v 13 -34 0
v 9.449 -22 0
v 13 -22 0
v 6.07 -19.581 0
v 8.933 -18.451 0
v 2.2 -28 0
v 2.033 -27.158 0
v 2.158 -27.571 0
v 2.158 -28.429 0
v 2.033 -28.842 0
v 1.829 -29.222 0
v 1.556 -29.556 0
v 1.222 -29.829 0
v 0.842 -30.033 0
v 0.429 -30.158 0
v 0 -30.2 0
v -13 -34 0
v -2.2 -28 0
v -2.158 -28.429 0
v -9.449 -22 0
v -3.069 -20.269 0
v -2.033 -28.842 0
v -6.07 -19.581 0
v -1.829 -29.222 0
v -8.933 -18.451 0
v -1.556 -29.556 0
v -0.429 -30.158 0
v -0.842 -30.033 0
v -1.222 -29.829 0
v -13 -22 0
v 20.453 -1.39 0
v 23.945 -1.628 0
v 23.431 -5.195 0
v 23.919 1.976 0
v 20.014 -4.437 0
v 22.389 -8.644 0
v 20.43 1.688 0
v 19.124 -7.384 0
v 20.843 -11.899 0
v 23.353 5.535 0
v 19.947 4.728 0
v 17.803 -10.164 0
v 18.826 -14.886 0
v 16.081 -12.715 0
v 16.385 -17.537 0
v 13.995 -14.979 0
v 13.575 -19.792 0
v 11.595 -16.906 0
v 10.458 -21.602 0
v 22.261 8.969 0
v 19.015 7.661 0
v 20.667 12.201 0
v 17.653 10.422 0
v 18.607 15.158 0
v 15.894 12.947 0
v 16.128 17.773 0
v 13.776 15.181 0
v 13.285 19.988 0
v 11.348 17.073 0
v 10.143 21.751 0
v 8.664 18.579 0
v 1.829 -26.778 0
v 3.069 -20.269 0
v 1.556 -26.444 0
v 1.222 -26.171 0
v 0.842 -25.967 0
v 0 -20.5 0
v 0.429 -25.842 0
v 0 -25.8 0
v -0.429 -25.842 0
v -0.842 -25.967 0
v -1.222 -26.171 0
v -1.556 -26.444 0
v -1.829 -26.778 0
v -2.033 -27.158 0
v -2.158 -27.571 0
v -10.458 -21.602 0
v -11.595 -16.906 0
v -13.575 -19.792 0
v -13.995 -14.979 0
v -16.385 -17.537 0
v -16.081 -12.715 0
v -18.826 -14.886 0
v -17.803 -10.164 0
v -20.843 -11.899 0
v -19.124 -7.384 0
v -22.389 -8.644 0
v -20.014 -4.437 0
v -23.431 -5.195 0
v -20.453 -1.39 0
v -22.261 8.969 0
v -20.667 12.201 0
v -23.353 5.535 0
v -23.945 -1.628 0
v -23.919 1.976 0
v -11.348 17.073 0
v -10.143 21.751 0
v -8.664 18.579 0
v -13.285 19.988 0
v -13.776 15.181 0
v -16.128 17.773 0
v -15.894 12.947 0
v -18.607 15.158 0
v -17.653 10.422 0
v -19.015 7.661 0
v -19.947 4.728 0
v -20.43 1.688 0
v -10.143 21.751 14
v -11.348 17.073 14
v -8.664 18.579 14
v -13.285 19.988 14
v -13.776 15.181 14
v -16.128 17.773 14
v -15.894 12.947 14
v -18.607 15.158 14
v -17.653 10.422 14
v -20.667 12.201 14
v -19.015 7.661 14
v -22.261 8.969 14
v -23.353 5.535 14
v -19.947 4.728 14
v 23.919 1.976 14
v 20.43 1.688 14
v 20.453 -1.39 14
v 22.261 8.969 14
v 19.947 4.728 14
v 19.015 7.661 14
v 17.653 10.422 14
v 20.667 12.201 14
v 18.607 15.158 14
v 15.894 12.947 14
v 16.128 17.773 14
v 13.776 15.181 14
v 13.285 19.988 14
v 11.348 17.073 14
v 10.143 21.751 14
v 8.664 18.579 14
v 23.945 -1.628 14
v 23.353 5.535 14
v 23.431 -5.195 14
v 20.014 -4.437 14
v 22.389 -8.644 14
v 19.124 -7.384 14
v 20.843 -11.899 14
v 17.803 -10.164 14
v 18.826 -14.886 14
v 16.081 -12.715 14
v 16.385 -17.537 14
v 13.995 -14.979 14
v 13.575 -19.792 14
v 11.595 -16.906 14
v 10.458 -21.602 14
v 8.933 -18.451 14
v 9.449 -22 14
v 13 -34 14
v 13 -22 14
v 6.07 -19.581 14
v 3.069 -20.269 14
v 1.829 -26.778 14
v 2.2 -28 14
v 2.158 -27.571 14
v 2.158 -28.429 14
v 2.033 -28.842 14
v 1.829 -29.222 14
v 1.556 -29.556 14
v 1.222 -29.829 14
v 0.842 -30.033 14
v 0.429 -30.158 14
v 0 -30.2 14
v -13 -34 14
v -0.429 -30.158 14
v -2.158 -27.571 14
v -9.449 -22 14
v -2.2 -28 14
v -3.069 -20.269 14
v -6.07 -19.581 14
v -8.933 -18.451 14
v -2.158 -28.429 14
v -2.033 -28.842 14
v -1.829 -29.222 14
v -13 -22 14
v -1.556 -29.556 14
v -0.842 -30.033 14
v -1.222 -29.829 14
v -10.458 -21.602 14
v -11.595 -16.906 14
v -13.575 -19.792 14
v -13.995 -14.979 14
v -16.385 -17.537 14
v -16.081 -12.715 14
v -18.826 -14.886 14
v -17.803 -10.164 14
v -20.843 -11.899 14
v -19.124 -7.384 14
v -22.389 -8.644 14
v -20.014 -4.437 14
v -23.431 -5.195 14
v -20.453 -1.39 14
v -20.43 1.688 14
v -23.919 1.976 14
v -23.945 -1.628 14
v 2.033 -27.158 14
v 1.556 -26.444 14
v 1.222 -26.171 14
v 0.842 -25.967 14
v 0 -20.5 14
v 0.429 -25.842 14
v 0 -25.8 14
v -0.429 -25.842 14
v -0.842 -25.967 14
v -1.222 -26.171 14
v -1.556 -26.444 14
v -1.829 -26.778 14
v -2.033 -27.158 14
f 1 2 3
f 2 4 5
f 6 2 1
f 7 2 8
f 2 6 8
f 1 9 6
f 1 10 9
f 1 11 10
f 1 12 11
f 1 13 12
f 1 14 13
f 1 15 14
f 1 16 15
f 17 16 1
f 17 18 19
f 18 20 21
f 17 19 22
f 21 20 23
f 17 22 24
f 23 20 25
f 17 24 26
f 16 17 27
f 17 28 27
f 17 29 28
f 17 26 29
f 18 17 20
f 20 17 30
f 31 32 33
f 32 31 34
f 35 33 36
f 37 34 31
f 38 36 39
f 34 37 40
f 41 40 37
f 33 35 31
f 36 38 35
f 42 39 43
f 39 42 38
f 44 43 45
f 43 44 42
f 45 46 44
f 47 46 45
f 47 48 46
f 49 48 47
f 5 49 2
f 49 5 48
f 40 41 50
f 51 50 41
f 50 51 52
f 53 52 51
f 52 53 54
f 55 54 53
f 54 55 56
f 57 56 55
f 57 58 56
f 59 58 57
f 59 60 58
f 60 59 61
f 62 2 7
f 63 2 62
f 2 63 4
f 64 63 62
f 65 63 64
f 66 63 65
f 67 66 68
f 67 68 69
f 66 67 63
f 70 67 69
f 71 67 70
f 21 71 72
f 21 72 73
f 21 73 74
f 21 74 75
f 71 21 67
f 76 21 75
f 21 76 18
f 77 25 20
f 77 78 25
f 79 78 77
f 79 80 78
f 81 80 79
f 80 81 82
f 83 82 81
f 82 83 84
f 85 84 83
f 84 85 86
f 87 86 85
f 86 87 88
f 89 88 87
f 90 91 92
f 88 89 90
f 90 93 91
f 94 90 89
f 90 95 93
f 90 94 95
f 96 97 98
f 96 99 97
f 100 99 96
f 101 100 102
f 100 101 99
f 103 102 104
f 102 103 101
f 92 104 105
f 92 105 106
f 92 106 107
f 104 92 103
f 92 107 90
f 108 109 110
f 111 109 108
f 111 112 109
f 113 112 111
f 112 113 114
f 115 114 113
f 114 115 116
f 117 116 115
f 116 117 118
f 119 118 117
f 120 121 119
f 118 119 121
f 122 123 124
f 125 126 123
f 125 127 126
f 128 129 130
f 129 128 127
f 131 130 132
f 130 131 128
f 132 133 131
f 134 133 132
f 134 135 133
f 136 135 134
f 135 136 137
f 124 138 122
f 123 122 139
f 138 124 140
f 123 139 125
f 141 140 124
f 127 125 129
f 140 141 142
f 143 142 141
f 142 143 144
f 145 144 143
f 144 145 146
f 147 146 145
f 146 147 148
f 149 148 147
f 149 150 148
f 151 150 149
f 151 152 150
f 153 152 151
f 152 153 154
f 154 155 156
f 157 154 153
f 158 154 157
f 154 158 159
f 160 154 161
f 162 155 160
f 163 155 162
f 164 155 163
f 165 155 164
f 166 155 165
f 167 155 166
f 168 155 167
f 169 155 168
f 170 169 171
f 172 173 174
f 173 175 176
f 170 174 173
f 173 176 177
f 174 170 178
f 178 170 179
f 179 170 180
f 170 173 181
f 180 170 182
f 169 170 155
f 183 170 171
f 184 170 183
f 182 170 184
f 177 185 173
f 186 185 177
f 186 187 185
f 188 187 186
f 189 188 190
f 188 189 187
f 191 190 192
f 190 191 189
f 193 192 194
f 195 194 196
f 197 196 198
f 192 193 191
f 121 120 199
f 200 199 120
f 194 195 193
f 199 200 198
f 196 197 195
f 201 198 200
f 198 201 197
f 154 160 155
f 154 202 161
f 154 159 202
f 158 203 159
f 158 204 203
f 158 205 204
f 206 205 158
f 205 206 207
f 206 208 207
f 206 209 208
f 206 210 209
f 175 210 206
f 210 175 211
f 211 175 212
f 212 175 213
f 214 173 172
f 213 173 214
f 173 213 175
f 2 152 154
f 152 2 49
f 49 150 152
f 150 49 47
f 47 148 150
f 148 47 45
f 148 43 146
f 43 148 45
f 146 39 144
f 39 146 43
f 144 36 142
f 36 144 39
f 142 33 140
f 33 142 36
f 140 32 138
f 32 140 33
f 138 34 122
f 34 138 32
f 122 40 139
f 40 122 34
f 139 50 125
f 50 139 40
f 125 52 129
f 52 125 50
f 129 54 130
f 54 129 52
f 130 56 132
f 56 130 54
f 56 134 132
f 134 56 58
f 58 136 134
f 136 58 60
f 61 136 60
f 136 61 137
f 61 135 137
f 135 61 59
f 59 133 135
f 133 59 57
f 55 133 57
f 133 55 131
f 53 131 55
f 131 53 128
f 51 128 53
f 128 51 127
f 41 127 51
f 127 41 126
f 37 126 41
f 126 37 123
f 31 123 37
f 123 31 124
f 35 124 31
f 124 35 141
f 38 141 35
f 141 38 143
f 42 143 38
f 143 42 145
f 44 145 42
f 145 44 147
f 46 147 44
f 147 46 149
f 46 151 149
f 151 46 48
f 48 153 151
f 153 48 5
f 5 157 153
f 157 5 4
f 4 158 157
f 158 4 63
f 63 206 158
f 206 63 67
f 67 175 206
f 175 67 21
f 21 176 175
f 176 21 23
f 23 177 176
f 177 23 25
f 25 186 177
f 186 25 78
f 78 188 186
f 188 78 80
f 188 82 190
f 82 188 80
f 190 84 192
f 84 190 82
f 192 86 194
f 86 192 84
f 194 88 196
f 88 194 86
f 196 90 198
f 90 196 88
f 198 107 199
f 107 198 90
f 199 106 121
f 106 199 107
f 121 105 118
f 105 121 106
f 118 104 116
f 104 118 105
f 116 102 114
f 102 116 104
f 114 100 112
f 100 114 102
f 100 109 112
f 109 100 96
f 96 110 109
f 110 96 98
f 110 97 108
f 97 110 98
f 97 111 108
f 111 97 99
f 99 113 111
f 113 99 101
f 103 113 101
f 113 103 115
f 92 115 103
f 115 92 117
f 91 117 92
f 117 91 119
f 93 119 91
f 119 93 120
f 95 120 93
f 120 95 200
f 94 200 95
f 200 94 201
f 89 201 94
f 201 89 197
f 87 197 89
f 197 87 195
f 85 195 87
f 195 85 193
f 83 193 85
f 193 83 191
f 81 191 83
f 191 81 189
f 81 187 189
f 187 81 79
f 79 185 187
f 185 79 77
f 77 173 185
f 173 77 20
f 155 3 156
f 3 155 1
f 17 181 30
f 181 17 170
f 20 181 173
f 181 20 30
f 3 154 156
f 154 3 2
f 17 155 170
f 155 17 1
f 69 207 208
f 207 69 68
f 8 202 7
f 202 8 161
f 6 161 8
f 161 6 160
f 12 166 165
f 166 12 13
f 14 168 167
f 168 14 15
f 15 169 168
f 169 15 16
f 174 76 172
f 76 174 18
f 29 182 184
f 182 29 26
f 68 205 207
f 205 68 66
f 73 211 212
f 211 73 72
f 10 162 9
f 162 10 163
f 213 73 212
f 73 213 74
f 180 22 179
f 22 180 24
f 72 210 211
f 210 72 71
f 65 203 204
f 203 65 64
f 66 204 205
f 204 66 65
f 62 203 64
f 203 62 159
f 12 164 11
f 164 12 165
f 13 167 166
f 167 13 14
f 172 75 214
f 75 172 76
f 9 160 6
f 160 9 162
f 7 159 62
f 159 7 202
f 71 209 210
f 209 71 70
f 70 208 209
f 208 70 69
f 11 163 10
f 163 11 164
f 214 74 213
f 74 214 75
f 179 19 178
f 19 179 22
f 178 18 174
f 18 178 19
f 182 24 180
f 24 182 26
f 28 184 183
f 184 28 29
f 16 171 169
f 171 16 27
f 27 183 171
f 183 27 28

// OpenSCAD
$fn = 32;

// ----------------------------------------------------------------------
// Spring clip: 48 mm outside, 3.5 mm band, 50 degree opening
// ----------------------------------------------------------------------

// --- parameters (mm) ---
outer_r = 24;             // clip outside radius
inner_r = 20.5;           // clip bore radius
band = 3.5;               // band thickness
clip_w = 14;              // clip width
opening = 50;             // opening angle
tab_w = 26;               // tab width
tab_len = 10;             // tab length past the clip
tab_hole = 4.4;           // tab fixing hole

clip_profile = [[-10.143, 21.751], [-13.285, 19.988], [-16.128, 17.773], [-18.607, 15.158], [-20.667, 12.201], [-22.261, 8.969], [-23.353, 5.535], [-23.919, 1.976], [-23.945, -1.628], [-23.431, -5.195], [-22.389, -8.644], [-20.843, -11.899], [-18.826, -14.886], [-16.385, -17.537], [-13.575, -19.792], [-10.458, -21.602], [-7.106, -22.924], [-3.593, -23.729], [0, -24], [3.593, -23.729], [7.106, -22.924], [10.458, -21.602], [13.575, -19.792], [16.385, -17.537], [18.826, -14.886], [20.843, -11.899], [22.389, -8.644], [23.431, -5.195], [23.945, -1.628], [23.919, 1.976], [23.353, 5.535], [22.261, 8.969], [20.667, 12.201], [18.607, 15.158], [16.128, 17.773], [13.285, 19.988], [10.143, 21.751], [8.664, 18.579], [11.348, 17.073], [13.776, 15.181], [15.894, 12.947], [17.653, 10.422], [19.015, 7.661], [19.947, 4.728], [20.43, 1.688], [20.453, -1.39], [20.014, -4.437], [19.124, -7.384], [17.803, -10.164], [16.081, -12.715], [13.995, -14.979], [11.595, -16.906], [8.933, -18.451], [6.07, -19.581], [3.069, -20.269], [0, -20.5], [-3.069, -20.269], [-6.07, -19.581], [-8.933, -18.451], [-11.595, -16.906], [-13.995, -14.979], [-16.081, -12.715], [-17.803, -10.164], [-19.124, -7.384], [-20.014, -4.437], [-20.453, -1.39], [-20.43, 1.688], [-19.947, 4.728], [-19.015, 7.661], [-17.653, 10.422], [-15.894, 12.947], [-13.776, 15.181], [-11.348, 17.073], [-8.664, 18.579]];

difference() {
  union() {
    linear_extrude(height = clip_w) polygon(clip_profile);
    /* mounting tab, sunk 2 mm into the band */
    translate([-13, -34, 0]) cube([tab_w, 12, clip_w]);
  }
  translate([0, -28, -2.5]) cylinder(h = clip_w + 5, d = tab_hole);
}
